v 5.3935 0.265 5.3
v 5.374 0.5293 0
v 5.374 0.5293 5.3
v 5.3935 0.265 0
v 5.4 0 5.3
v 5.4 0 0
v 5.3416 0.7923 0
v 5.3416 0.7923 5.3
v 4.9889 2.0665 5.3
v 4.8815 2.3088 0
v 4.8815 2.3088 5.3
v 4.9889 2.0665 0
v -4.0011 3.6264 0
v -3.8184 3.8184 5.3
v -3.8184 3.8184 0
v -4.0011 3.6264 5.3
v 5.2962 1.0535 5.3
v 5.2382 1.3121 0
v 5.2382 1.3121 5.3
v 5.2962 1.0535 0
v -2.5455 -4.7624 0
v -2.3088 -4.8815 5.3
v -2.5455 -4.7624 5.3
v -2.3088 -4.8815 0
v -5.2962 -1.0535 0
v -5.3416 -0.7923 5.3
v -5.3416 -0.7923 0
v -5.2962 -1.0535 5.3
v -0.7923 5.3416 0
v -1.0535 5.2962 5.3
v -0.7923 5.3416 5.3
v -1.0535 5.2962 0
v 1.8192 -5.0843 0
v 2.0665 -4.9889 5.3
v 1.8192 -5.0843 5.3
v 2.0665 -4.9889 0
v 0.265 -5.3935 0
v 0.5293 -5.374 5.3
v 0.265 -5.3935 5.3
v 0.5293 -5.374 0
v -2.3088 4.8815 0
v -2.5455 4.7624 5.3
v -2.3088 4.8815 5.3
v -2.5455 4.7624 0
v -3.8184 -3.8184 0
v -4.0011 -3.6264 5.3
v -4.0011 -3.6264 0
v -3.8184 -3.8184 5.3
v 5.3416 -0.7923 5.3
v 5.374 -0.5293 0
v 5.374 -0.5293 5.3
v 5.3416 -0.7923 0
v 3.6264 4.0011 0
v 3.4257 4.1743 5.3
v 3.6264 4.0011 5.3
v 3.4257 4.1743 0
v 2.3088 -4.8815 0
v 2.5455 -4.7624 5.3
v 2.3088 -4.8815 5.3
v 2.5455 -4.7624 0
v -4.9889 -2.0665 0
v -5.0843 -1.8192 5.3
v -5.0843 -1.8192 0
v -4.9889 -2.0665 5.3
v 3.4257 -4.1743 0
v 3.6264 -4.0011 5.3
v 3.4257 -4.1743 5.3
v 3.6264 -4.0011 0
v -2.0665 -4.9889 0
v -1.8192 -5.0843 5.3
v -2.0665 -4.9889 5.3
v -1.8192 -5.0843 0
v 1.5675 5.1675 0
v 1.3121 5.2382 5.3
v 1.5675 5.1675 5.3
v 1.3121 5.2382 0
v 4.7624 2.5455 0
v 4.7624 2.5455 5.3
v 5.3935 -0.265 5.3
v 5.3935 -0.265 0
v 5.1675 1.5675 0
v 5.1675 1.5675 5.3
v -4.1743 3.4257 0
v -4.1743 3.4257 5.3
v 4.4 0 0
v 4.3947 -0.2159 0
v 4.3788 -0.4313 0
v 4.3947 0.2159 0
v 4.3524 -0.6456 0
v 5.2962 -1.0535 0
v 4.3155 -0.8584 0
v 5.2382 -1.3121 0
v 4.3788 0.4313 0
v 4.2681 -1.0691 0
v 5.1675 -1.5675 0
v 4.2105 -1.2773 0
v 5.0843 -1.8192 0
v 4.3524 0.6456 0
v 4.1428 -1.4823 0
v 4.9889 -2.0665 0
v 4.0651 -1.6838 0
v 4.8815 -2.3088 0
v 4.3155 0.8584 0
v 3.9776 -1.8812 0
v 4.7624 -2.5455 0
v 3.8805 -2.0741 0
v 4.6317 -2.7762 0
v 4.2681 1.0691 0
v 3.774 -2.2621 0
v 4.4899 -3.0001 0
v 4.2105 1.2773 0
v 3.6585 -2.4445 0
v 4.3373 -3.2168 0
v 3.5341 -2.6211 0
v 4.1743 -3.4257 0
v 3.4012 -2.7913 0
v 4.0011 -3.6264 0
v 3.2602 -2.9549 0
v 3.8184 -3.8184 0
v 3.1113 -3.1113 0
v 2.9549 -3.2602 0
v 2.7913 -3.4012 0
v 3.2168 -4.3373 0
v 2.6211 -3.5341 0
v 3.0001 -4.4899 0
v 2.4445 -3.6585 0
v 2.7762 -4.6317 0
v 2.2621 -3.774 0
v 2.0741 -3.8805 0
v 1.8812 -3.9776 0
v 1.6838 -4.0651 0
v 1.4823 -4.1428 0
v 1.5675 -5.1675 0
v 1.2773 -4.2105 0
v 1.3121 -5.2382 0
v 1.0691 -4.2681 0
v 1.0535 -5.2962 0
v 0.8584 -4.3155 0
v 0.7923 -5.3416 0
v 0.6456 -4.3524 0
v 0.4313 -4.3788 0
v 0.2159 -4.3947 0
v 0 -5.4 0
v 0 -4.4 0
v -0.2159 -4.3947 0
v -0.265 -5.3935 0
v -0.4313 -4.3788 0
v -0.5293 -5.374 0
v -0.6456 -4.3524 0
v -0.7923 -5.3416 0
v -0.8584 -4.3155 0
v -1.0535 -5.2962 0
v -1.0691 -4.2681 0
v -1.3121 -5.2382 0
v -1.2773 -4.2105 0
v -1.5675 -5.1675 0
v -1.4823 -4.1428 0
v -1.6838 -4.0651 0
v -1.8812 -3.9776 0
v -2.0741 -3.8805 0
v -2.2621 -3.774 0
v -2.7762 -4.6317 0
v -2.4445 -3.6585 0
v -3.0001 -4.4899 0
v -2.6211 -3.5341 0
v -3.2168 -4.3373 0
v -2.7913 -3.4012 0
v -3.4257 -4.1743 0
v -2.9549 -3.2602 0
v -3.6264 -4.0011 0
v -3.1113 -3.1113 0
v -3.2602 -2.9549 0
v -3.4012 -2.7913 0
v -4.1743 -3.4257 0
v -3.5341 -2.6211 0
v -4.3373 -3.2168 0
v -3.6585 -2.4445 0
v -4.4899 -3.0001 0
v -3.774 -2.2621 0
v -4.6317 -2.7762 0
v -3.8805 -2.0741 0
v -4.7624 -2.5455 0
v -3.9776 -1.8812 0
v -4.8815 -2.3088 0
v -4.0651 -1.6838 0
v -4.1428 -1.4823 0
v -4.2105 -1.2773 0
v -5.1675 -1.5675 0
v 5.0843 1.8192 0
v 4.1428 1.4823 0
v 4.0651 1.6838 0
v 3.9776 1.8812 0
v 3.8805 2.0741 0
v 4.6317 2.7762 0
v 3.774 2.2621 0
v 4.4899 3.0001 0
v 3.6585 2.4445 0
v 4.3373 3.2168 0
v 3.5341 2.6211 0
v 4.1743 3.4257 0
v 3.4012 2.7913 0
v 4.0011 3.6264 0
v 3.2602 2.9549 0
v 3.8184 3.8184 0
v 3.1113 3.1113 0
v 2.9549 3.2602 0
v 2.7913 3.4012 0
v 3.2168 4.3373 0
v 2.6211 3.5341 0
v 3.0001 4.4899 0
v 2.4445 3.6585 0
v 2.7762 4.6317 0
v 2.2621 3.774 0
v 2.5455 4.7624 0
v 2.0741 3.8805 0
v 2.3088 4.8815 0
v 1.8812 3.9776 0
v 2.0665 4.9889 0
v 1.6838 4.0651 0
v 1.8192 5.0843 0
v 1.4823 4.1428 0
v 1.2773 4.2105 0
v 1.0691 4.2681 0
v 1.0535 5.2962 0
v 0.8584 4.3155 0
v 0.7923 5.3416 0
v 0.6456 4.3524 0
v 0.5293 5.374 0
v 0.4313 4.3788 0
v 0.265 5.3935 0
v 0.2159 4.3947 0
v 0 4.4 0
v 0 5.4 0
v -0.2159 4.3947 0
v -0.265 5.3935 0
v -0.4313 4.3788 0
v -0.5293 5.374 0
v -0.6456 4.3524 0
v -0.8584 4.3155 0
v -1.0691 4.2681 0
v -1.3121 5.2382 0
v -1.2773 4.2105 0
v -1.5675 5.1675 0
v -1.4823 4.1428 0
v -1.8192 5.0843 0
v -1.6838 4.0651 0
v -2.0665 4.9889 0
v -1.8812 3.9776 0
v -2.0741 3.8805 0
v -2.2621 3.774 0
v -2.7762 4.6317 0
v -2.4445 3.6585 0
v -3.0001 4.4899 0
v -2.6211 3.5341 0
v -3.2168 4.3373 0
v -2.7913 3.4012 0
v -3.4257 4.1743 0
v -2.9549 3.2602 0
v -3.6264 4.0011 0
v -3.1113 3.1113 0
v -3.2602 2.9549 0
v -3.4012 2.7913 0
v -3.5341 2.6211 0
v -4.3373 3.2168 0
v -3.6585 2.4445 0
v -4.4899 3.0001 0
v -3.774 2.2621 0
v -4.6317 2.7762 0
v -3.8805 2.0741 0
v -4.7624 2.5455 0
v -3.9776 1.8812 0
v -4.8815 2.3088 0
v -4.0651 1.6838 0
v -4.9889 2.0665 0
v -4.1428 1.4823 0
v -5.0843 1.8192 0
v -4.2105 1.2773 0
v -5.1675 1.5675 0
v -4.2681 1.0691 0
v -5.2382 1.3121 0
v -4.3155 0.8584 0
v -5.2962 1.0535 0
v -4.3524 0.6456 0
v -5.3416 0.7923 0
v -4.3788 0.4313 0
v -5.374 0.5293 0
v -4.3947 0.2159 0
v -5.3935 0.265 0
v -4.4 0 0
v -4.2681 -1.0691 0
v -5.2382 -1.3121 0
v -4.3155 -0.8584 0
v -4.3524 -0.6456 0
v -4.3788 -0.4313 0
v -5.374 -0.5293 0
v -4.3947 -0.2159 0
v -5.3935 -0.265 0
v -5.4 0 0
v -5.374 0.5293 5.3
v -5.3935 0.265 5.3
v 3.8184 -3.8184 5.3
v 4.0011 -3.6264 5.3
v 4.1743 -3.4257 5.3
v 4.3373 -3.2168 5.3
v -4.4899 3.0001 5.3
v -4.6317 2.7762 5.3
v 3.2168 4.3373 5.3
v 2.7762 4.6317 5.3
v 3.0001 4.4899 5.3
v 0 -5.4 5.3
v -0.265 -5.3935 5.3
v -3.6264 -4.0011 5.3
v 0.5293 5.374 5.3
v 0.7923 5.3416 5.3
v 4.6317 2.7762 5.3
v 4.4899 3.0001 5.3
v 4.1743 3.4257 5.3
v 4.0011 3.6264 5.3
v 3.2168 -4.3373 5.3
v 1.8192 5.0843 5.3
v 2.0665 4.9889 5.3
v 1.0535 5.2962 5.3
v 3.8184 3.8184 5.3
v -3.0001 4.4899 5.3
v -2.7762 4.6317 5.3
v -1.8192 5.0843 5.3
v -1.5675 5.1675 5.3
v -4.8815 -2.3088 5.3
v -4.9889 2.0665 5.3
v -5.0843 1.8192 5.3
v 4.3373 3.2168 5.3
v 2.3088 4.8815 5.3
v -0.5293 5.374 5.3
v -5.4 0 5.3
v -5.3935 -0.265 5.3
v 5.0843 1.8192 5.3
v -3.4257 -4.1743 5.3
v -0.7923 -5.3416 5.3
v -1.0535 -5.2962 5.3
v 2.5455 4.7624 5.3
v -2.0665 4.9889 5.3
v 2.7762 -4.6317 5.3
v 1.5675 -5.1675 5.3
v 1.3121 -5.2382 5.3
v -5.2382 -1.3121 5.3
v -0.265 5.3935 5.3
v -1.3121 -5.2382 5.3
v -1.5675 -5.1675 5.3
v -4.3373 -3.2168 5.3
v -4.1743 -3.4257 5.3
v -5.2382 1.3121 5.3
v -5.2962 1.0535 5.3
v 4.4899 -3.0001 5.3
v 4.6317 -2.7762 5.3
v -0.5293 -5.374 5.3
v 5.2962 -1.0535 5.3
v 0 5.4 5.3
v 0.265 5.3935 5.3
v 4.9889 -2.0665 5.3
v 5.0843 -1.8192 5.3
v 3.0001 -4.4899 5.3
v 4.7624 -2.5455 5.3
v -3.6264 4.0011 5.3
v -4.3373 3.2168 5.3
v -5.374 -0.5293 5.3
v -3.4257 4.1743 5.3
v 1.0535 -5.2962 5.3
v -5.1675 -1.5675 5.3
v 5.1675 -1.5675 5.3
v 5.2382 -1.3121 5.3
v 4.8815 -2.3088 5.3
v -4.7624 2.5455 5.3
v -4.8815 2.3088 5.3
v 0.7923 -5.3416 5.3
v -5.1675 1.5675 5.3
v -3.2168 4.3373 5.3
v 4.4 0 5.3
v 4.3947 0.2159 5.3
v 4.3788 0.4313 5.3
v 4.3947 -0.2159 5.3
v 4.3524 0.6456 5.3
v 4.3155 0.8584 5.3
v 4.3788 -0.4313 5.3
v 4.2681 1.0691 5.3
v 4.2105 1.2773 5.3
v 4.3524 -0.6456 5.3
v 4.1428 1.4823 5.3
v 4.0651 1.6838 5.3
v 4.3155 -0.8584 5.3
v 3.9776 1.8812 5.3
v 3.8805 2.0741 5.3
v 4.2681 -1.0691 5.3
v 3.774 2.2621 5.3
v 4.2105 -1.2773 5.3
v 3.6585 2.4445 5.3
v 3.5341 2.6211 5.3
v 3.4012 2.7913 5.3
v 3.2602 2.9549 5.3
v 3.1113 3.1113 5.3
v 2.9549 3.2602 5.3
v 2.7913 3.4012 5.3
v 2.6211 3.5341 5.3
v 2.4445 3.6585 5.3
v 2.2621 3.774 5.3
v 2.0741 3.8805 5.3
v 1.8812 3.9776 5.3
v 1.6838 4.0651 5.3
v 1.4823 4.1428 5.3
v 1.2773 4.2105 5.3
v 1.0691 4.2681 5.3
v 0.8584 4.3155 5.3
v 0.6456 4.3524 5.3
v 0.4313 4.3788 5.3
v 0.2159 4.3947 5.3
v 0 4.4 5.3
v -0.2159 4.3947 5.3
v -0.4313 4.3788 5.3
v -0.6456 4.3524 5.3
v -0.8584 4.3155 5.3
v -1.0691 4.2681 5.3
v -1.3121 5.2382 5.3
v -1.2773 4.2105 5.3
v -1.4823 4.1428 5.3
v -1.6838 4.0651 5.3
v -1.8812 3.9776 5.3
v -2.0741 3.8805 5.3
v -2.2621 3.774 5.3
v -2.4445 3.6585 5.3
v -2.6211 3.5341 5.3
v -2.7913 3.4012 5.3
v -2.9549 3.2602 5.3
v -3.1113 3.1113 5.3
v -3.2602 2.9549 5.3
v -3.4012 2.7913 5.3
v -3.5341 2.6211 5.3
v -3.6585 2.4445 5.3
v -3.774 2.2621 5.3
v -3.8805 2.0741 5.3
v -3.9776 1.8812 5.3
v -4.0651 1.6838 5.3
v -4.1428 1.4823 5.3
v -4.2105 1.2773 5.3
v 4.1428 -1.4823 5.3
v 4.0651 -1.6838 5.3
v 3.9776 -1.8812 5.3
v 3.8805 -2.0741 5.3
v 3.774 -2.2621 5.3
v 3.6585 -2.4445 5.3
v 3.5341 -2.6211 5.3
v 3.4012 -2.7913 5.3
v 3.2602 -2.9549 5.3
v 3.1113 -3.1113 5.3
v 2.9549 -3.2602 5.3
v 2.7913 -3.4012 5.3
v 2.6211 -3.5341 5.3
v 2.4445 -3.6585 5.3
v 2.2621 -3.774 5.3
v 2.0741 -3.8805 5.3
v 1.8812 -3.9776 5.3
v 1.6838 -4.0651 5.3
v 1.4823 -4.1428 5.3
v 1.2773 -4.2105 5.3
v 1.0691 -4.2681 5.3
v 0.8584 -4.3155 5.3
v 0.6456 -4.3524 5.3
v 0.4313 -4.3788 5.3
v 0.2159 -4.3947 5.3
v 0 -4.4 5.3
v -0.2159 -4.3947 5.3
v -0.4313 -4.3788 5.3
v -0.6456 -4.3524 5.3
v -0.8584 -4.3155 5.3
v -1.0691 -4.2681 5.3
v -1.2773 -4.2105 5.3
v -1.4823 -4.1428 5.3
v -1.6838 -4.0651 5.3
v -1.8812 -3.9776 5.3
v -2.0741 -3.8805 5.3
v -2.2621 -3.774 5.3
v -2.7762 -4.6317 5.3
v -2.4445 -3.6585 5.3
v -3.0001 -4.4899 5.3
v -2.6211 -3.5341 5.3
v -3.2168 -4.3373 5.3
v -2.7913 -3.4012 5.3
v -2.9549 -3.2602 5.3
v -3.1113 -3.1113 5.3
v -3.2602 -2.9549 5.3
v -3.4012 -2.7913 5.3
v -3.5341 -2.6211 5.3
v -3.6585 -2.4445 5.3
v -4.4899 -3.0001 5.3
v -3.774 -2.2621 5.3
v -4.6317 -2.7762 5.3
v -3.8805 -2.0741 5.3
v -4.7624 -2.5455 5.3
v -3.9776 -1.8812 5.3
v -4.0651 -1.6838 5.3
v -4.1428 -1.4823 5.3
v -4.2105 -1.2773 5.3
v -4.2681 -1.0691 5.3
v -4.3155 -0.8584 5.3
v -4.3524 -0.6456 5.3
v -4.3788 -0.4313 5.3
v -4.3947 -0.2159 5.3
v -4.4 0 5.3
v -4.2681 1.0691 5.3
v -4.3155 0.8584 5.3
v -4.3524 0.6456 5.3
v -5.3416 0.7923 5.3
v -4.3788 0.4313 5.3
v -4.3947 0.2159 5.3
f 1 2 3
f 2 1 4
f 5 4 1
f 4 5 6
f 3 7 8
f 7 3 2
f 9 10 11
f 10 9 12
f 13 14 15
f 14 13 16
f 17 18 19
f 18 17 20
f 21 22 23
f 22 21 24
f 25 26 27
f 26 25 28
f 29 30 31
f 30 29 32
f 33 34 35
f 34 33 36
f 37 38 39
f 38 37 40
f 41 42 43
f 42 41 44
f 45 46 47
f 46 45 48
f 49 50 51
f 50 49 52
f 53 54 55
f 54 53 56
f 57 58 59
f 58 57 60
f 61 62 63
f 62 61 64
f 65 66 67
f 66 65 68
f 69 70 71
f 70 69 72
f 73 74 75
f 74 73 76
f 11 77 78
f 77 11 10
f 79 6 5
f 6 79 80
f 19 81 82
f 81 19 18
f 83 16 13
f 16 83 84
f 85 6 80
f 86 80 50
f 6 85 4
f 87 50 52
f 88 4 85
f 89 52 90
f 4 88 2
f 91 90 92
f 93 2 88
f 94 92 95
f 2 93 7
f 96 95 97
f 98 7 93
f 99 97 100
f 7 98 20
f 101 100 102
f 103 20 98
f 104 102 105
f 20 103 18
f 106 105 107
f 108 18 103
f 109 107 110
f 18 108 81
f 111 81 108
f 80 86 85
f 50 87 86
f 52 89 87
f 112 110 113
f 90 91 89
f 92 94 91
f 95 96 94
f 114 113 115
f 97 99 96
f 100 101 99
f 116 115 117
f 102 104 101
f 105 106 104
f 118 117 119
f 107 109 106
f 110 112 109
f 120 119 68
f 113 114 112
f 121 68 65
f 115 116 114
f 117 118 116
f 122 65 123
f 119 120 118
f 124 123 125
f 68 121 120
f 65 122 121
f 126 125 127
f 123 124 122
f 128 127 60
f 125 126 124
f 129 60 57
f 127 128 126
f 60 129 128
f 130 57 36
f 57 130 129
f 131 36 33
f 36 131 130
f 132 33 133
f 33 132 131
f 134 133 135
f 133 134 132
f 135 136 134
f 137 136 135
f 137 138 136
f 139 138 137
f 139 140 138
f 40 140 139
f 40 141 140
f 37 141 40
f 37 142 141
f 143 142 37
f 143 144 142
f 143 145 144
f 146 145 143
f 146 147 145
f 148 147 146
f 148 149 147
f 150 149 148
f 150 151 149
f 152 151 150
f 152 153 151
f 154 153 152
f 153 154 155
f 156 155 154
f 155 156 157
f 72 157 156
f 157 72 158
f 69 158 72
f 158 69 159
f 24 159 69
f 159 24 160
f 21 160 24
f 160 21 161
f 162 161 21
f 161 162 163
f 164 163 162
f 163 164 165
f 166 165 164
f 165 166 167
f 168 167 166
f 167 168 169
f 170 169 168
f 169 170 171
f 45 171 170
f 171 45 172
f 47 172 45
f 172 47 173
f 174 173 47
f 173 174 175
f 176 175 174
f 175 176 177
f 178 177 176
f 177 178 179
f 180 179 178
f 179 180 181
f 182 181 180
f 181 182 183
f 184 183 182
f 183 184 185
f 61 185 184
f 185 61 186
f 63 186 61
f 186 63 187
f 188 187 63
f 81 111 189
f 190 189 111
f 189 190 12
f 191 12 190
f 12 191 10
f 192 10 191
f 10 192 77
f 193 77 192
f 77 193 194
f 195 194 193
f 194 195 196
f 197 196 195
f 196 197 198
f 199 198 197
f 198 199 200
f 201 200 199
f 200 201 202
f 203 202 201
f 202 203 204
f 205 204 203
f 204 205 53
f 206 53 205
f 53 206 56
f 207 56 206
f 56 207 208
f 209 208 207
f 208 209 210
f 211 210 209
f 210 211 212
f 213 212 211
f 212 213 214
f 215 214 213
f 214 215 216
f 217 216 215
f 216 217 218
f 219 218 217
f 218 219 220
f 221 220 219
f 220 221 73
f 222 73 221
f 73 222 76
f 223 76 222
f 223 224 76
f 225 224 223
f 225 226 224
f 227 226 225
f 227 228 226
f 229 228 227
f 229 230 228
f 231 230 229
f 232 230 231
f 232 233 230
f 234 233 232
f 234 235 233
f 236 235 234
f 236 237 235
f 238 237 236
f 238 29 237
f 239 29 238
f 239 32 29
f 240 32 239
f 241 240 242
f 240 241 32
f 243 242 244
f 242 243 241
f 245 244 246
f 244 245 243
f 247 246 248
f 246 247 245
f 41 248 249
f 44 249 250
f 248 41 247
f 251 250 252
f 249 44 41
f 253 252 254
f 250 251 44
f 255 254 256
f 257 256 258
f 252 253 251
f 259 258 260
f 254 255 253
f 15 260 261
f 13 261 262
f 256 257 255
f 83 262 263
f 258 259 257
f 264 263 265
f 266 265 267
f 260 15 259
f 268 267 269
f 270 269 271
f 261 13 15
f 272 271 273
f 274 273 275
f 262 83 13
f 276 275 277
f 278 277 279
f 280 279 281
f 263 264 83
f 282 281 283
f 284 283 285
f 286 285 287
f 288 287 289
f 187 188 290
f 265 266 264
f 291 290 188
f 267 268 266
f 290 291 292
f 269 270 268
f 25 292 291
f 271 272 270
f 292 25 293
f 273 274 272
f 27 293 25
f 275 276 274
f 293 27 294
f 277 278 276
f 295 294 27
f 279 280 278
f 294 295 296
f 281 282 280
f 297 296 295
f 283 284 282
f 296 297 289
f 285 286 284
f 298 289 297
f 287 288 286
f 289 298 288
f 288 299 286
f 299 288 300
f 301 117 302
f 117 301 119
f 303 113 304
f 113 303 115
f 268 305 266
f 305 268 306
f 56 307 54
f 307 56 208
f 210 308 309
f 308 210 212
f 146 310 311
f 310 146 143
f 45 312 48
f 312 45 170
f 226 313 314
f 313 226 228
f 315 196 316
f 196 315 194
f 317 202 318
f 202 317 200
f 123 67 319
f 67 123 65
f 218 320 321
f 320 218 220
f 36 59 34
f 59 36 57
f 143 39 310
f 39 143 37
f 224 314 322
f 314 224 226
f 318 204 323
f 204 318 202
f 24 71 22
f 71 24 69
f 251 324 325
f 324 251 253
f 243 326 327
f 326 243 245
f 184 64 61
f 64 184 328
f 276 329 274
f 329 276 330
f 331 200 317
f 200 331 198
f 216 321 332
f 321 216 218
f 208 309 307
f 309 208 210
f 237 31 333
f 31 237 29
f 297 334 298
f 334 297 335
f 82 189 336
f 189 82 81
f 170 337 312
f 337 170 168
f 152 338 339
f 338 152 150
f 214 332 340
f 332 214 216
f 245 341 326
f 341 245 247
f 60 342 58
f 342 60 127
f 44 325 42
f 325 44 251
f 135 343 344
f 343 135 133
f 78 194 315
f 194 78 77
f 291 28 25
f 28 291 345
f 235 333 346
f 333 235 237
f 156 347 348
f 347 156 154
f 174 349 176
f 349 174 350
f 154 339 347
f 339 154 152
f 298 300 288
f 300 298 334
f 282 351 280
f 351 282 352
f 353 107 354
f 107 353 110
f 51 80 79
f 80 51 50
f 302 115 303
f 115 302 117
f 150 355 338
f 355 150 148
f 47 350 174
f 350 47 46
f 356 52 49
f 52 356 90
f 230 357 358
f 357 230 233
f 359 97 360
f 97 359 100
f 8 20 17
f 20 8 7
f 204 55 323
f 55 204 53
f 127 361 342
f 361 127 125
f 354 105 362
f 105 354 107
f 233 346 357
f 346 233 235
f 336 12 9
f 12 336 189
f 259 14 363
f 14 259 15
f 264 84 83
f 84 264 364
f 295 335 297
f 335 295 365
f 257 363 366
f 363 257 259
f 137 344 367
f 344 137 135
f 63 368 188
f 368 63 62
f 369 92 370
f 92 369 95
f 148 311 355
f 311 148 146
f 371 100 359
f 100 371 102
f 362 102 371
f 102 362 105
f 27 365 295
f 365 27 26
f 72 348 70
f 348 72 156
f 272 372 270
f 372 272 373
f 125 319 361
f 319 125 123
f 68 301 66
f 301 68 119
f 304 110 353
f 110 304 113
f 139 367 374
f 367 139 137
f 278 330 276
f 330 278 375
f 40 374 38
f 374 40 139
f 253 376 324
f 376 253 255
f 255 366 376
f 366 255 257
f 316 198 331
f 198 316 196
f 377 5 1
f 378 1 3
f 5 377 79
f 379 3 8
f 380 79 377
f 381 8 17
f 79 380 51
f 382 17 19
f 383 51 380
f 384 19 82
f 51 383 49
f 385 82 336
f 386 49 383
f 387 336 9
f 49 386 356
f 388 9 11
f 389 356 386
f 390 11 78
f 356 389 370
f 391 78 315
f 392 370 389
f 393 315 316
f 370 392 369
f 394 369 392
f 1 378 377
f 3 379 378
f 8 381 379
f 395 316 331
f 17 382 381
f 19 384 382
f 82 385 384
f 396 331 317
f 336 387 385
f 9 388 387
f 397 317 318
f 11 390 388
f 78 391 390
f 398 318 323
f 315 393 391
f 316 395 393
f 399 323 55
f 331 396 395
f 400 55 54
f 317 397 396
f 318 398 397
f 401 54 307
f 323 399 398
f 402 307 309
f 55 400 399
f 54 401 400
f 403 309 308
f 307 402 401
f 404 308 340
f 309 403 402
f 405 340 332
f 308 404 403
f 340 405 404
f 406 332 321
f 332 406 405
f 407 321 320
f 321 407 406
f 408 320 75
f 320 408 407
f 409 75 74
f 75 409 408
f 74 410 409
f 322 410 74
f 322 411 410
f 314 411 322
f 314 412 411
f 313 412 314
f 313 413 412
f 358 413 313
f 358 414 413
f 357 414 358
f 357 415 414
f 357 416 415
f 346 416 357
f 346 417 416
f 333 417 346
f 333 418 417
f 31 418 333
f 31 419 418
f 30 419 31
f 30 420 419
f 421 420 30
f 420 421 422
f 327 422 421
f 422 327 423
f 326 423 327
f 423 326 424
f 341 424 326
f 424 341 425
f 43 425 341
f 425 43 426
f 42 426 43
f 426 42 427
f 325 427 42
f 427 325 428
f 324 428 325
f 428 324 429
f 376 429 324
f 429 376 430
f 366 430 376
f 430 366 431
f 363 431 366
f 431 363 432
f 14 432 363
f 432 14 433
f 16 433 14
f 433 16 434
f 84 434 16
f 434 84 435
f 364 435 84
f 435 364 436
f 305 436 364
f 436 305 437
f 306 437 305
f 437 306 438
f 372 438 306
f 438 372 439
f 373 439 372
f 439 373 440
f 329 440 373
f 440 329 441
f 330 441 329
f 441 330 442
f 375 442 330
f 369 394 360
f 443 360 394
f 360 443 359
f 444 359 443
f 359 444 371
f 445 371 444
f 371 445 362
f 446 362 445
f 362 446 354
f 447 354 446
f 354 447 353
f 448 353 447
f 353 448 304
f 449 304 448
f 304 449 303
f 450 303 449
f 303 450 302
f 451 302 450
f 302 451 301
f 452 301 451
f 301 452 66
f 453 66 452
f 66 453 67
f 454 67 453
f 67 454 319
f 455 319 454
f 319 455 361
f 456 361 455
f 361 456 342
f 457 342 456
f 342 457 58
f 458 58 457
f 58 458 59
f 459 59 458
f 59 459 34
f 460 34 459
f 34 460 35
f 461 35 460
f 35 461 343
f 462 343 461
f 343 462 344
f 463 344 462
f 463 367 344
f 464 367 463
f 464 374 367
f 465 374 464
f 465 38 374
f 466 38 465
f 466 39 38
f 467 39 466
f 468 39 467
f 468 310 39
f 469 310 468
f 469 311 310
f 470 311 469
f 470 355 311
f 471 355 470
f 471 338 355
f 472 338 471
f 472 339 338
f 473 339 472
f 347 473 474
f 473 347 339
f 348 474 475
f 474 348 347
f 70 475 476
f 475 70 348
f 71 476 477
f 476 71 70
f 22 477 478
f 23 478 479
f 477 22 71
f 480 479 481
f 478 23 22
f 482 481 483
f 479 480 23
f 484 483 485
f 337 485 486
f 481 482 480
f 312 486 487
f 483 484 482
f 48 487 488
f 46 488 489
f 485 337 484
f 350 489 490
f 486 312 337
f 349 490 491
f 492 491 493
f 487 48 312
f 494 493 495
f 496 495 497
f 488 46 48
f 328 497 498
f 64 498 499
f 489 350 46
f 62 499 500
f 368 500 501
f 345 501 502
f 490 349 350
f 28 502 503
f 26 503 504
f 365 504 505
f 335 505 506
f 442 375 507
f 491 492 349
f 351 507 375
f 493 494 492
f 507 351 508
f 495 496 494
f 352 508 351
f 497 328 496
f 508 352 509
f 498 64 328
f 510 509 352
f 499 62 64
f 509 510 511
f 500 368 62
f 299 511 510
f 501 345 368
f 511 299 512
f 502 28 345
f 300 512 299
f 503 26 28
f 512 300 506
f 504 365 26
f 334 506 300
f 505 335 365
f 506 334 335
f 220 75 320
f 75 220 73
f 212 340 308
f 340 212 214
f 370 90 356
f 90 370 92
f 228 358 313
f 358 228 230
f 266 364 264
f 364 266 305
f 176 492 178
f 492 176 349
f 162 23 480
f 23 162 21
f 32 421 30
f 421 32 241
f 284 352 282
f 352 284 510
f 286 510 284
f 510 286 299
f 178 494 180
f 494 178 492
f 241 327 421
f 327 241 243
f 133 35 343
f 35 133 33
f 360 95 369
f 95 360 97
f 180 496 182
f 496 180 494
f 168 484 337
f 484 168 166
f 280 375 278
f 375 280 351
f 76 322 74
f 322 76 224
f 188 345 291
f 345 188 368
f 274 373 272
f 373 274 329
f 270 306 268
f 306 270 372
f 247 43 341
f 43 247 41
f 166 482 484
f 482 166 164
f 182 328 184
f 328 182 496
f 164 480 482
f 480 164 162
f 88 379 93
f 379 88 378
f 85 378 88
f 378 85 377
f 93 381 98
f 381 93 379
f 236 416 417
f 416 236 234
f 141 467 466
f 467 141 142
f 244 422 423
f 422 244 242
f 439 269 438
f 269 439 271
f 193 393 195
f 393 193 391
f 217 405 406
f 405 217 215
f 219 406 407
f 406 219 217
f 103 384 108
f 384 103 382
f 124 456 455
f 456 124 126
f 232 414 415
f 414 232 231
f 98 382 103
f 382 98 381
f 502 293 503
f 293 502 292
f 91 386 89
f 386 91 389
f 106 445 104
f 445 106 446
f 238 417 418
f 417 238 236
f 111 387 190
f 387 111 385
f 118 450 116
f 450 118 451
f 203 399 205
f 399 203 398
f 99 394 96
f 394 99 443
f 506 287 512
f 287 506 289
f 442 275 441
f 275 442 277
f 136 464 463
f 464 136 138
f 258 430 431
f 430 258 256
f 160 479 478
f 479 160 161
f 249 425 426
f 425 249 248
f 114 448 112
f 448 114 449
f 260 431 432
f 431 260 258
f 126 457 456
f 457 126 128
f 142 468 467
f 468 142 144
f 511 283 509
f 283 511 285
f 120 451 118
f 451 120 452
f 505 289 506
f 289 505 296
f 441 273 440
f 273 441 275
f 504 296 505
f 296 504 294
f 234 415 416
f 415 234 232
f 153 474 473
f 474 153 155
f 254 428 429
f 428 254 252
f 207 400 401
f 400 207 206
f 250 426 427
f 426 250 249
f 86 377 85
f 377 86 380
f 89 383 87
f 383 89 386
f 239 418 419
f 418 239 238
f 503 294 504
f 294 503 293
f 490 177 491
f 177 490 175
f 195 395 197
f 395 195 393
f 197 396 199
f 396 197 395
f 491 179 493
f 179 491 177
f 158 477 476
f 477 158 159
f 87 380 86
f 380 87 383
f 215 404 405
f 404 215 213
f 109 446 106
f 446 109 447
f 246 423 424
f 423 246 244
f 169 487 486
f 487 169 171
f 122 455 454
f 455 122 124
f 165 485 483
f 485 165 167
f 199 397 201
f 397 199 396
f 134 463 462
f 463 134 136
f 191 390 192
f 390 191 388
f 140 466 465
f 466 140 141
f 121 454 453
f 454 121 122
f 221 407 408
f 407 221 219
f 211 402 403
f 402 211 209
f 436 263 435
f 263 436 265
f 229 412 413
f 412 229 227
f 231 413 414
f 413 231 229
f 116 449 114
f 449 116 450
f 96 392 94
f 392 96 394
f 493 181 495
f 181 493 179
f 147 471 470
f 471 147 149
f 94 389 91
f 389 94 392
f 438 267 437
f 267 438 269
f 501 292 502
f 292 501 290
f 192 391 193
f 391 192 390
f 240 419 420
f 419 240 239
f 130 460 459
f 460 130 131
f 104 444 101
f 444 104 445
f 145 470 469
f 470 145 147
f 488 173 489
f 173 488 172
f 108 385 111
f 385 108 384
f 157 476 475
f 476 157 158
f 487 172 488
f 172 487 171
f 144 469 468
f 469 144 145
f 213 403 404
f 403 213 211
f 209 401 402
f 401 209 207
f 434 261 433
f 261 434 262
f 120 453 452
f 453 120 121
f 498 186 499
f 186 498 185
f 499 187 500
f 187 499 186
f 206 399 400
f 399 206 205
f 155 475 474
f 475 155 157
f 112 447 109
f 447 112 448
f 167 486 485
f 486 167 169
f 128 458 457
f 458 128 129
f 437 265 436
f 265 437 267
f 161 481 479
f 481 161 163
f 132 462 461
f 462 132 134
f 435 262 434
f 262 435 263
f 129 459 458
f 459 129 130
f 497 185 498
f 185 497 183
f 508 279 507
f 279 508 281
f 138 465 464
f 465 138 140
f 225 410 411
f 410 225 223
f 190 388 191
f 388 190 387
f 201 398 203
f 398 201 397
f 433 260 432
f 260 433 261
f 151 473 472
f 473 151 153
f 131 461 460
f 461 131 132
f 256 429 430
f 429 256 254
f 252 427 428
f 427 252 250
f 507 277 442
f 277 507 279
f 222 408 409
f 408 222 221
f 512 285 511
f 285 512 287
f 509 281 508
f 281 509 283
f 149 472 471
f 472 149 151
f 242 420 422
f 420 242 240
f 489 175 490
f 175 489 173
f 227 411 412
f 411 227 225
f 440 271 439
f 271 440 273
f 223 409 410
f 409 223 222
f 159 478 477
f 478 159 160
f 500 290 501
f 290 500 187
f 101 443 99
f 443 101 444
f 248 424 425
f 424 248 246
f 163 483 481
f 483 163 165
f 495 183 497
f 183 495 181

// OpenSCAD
$fn=128;

module radial(d=[10.8, 10.8, 5.3, 1]) {
    // d = [outer_diameter, inner_diameter, height, wall_thickness]
    od = d[0];
    id = d[1];
    h  = d[2];
    t  = d[3];

    // If inner diameter equals outer diameter, interpret as a ring with thickness t
    inner_d = (id >= od) ? max(0, od - 2*t) : id;

    difference() {
        cylinder(d=od, h=h);
        translate([0,0,-0.01]) cylinder(d=inner_d, h=h+0.02);
    }
}

radial([10.8, 10.8, 5.3, 1]);
